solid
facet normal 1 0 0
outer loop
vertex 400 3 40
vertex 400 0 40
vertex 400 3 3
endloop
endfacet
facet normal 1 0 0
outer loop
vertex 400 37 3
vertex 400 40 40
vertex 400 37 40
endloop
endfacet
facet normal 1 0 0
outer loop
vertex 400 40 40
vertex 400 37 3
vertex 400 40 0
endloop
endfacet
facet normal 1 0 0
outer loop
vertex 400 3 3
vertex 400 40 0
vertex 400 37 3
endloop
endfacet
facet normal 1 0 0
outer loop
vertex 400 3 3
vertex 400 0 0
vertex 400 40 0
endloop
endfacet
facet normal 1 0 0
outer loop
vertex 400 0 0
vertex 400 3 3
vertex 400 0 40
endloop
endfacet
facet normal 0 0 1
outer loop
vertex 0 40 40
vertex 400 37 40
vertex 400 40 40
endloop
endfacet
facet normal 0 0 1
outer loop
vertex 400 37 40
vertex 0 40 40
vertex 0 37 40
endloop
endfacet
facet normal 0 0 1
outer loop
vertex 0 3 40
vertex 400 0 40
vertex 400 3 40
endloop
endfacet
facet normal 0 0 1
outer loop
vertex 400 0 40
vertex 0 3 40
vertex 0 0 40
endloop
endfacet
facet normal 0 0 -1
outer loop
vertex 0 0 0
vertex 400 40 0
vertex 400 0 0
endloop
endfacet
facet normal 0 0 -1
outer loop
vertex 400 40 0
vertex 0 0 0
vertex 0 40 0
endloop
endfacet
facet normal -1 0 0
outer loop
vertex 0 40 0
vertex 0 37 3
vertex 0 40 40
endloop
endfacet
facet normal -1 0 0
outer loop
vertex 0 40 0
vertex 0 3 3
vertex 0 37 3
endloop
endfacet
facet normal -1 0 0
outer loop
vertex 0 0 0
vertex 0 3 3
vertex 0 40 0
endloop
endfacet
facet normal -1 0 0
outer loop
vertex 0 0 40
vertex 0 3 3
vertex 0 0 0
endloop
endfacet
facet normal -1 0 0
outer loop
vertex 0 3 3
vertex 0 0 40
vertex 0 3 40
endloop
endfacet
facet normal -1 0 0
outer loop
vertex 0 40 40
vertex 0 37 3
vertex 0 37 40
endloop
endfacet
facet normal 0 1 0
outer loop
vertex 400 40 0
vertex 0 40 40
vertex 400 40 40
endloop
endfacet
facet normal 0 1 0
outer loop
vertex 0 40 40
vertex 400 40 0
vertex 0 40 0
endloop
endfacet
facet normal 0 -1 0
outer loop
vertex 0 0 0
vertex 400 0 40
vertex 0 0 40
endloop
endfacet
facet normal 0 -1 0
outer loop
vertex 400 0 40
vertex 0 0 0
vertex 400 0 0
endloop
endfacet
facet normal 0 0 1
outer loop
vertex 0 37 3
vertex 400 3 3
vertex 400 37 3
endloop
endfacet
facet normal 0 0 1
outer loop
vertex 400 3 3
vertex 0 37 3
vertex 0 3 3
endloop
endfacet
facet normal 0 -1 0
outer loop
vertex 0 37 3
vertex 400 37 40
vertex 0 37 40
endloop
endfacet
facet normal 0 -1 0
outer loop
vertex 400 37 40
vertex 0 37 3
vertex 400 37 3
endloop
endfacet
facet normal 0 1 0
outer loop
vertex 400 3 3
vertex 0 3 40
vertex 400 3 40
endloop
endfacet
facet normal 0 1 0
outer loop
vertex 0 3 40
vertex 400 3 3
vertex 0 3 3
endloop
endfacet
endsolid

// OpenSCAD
// file: utils.scad
// Author: Mihai Oltean, www.tcreate.org, mihai.oltean@gmail.com
// More details: jenny5.org
// Source: github.com/jenny5-robot
// MIT License
//--------------------------------------------------------------

module colt(radius, height)
{
	difference(){
		cube ([radius, radius, height]);
		cylinder	(h = height, r = radius, $fn = 30);
	}
}
/////////////////////////////////////////////////////////////////////////////////////////////////////////////////////////
module colt_sferic(radius)
{
	difference(){
		cube ([radius, radius, radius]);
		sphere(r = radius, $fn = 40);
	}
}
/////////////////////////////////////////////////////////////////////////////////////////////////////////////////////////
module coloana_sferica(height, radius)
{
		difference(){
			cube ([height, height, height]);
			cylinder(h= height, r = radius, $fn = 50);
		}
}
/////////////////////////////////////////////////////////////////////////////////////////////////////////////////////////
// file: params_screws_nuts_washers.scad
m2_screw_radius = 1;
m2_nut_radius = 2.2;
m2_nut_height = 1.6;
m2_nut_thick = m2_nut_height;

m3_screw_radius = 1.5;
m3_nut_radius = 3.1;
m3_nut_height = 2.3;
m3_nut_thick = m3_nut_height;
m3_autolock_nut_thick = m3_nut_thick + 1;

m4_screw_radius = 2;
m4_nut_radius = 4;
m4_auto_lock_nut_height = 5;
m4_nut_height = 3.25;
m4_nut_thick = 3.25;

m5_screw_radius = 2.5;
m5_nut_radius = 4.6;
m5_nut_height = 4;

m6_screw_radius = 3;
m6_nut_radius = 5.65;
m6_nut_thick = 5;
m6_nut_slim_thick = 3;
m6_autolock_nut_thick = 6;
m6_long_nut_thick = 9;

m8_screw_head_height = 5.7;
m8_screw_radius = 3.9;
m8_nut_small_width = 12.8;
m8_nut_radius = 7.35;
m8_slim_nut_small_width = 12.4;
m8_nut_thick = 6.5;
m8_nut_height = m8_nut_thick;
m8_slim_nut_height = 5.5;
m8_screw_head_radius = 6.5;
m8_autolock_nut_thick = 8;

m10_screw_radius = 5;
m10_nut_thick = 8;
m10_nut_radius = 9.8;

m12_screw_radius = 6;
m12_nut_thick = 8;
m12_nut_radius = 11;

m10_long_nut_radius = 9.71;
m10_long_nut_height = 29.8;

m10_long_thick_nut_radius = 7.41;
m10_long_thick_nut_height = 30.4;

m12_plastic_nut_radius = 10.45;
m12_plastic_nut_height = 23.3;

tr12_3_nut_radius = 11;
tr12_3_nut_height = 18.1;

washer_5 = 0.97;

washer_4_12_radius = 6;
washer_4_12_external_radius = 6;
washer_4_12_thick = 1;
washer_4_thick = 1;
washer_4_12_internal_radius = 2.15;

washer_4_9_external_radius = 4.5;
washer_4_9_internal_radius = 2.15;
washer_4_9_thick = 1;

washer_6_thick = 1.5;
washer_8_thick = 1.5;
washer_5_thick = 1;

washer_10_height = 2;
// file: params_stepper_motors.scad
// Author: Mihai Oltean, www.tcreate.org, mihai.oltean@gmail.com
// More details: jenny5.org
// Source: github.com/jenny5-robot
// MIT License
//--------------------------------------------------------------

nema_17_width = 42.3;
nema_17_motor_height_sparkfun = 36;
nema_17_motor_hole_radius_sparkfun  = 14;
nema_17_motor_hole_radius_camiel  = 12;
nema_17_dist_between_screw_holes = 31;
nema_17_height = 47;
nema_17_shaft_length = 24;

nema_14_width = 39.3;
nema_14_motor_hole_radius  = 11;
nema_14_dist_between_screw_holes = 31;
nema_14_height = 47;
nema_14_shaft_length = 20;

nema_11_width = 28;
nema_11_motor_hole_radius = 11;
nema_11_motor_gearbox_radius = 14;
nema_11_motor_gearbox_hole_radius = 9;
nema_11_gearbox_dist_between_screw_holes = 22 / sqrt(2);
nema_11_dist_between_screw_holes = 23;
nema_11_height = 32;
nema_11_with_gearbox_height = 53;
nema_11_gearbox_length = 25;
nema_11_shaft_length = 18;

nema_17_motor_gearbox_radius = 18;
nema_17_gearbox_dist_between_screw_holes = 20;
nema_17_with_gearbox_height = 82.8;
nema_17_gearbox_length = 30;
nema_17_gearbox_base_height = 5;
nema_17_gearbox_shaft_length = 18;
nema_17_gearbox_shaft_radius = 4;
nema_17_gearbox_motor_hole_radius  = 11;



nema_11_sizes = [nema_11_width, nema_11_width, nema_11_height];

gauri_nema_17 = [
[0, 0, 0], 
[-nema_17_dist_between_screw_holes / 2, -nema_17_dist_between_screw_holes / 2, 0], 
[-nema_17_dist_between_screw_holes / 2, nema_17_dist_between_screw_holes / 2, 0], 
[nema_17_dist_between_screw_holes / 2, -nema_17_dist_between_screw_holes / 2, 0], 
[nema_17_dist_between_screw_holes / 2, nema_17_dist_between_screw_holes / 2, 0]
];

gauri_nema_11 = [
[0, 0, 0], 
[-nema_11_dist_between_screw_holes / 2, -nema_11_dist_between_screw_holes / 2, 0], 
[-nema_11_dist_between_screw_holes / 2, nema_11_dist_between_screw_holes / 2, 0], 
[nema_11_dist_between_screw_holes / 2, -nema_11_dist_between_screw_holes / 2, 0], 
[nema_11_dist_between_screw_holes / 2, nema_11_dist_between_screw_holes / 2, 0]
];

gearbox_nema_11_holes_position = [[0, 0, 0], 
[-nema_11_gearbox_dist_between_screw_holes / 2, -nema_11_gearbox_dist_between_screw_holes / 2, 0], [-nema_11_gearbox_dist_between_screw_holes / 2, nema_11_gearbox_dist_between_screw_holes / 2, 0], [nema_11_gearbox_dist_between_screw_holes / 2, -nema_11_gearbox_dist_between_screw_holes / 2, 0], [nema_11_gearbox_dist_between_screw_holes / 2, nema_11_gearbox_dist_between_screw_holes / 2, 0]];

gearbox_nema_17_holes_position = [
[0, 0, 0], 
[-nema_17_gearbox_dist_between_screw_holes / 2, -nema_17_gearbox_dist_between_screw_holes / 2, 0], 
[-nema_17_gearbox_dist_between_screw_holes / 2, nema_17_gearbox_dist_between_screw_holes / 2, 0], 
[nema_17_gearbox_dist_between_screw_holes / 2, -nema_17_gearbox_dist_between_screw_holes / 2, 0], 
[nema_17_gearbox_dist_between_screw_holes / 2, nema_17_gearbox_dist_between_screw_holes / 2, 0]
];
// file: config.scad
// Author: Mihai Oltean, www.tcreate.org, mihai.oltean@gmail.com
// More details: jenny5.org
// Source: github.com/jenny5-robot
// MIT License
//--------------------------------------------------------------

aluminium_color = "Silver";
screw_color = "LightSlateGray";
frame_color = aluminium_color;
shaft_color = "Silver";
plastic_color = "LimeGreen";
pulley_color = "DarkSlateGray";
// file: params_basic_components.scad
// Author: Mihai Oltean, www.tcreate.org, mihai.oltean@gmail.com
// More details: jenny5.org
// Source: github.com/jenny5-robot
// MIT License
//--------------------------------------------------------------

spring_length = 20;

smooth_rod_8_radius = 4;
smooth_rod_10_radius = 5;
smooth_rod_12_radius = 6;

tolerance = 0.1;
display_tolerance = 1;

overlap_tolerance = 0.01;


wall_thick_1 = 1;
wall_thick_2 = 2;
wall_thick_3 = 3;
wall_thick_4 = 4;
wall_thick_5 = 5;
wall_thick_5_5 = 5.5;
wall_thick_6 = 6;
wall_thick_7 = 7;
wall_thick_8 = 8;
wall_thick_9 = 9;
wall_thick_10 = 10;
wall_thick_12 = 10;

wrench_radius = 11;

ghidaj_radius = 4;
ghidaj_radius_12 = 6;

canal_diameter = 8.22;
canal_height = 2.2;

filament_radius = 0.9;

bowden_tube_radius = 2.5;

m3_tolerance = 0.1;

latura_mare_L = 40;
latura_mica_L = 15;
grosime_perete_L = 3;

latura_L_50x50 = 50;
latura_L_40x40 = 40;

latura_U_50x50 = 50;
latura_U_40x40 = 40;


tolerance_z = [0, 0, tolerance];
tolerance_x = [tolerance, 0, 0];
tolerance_y = [0, tolerance, 0];

display_tolerance_z = [0, 0, display_tolerance];
display_tolerance_x = [display_tolerance, 0, 0];
display_tolerance_y = [0, display_tolerance, 0];
// main file
// Author: Mihai Oltean, www.tcreate.org, mihai.oltean@gmail.com
// More details: jenny5.org
// Source: github.com/jenny5-robot
// MIT License
//--------------------------------------------------------------

include <params_basic_components.scad>
include <config.scad>
include <basic_components.scad>
include <params_stepper_motors.scad>

////////////////////////////////////////////////////////////////////////////////////////////////////////////////////////////////////////////
module gauri_nema(nema_width, nema_dist_between_screw_holes, adancime, radius1 = 1.5, radius2 = 1.5, tolerance_x = 0, tolerance_y = 0)
{
	radius = m3_screw_radius;
hull(){
	translate ([nema_width / 2 - nema_dist_between_screw_holes / 2 - tolerance_x, nema_width / 2 - nema_dist_between_screw_holes / 2 - tolerance_y, 0] - display_tolerance_z) cylinder (h = adancime + 2 * display_tolerance, r1 = radius1, r2 = radius2, $fn = 50);
	translate ([nema_width / 2 - nema_dist_between_screw_holes / 2 + tolerance_x, nema_width / 2 - nema_dist_between_screw_holes / 2 + tolerance_y, 0] - display_tolerance_z) cylinder (h = adancime + 2 * display_tolerance, r1 = radius1, r2 = radius2, $fn = 50);
}
hull(){
	translate ([nema_width / 2 + nema_dist_between_screw_holes / 2 - tolerance_x, nema_width / 2 - nema_dist_between_screw_holes / 2 - tolerance_y, 0] - display_tolerance_z) cylinder (h = adancime + 2 * display_tolerance, r1 = radius1, r2 = radius2, $fn = 50);
	translate ([nema_width / 2 + nema_dist_between_screw_holes / 2 + tolerance_x, nema_width / 2 - nema_dist_between_screw_holes / 2 + tolerance_y, 0] - display_tolerance_z) cylinder (h = adancime + 2 * display_tolerance, r1 = radius1, r2 = radius2, $fn = 50);
}
hull(){
	translate ([nema_width / 2 - nema_dist_between_screw_holes / 2 - tolerance_x, nema_width / 2 + nema_dist_between_screw_holes / 2 - tolerance_y, 0] - display_tolerance_z) cylinder (h = adancime + 2 * display_tolerance, r1 = radius1, r2 = radius2, $fn = 50);
	translate ([nema_width / 2 - nema_dist_between_screw_holes / 2 + tolerance_x, nema_width / 2 + nema_dist_between_screw_holes / 2 + tolerance_y, 0] - display_tolerance_z) cylinder (h = adancime + 2 * display_tolerance, r1 = radius1, r2 = radius2, $fn = 50);
}
hull(){
	translate ([nema_width / 2 + nema_dist_between_screw_holes / 2 - tolerance_x, nema_width / 2 + nema_dist_between_screw_holes / 2 - tolerance_y, 0] - display_tolerance_z) cylinder (h = adancime  + 2 * display_tolerance, r1 = radius1, r2 = radius2, $fn = 50);
	translate ([nema_width / 2 + nema_dist_between_screw_holes / 2 + tolerance_x, nema_width / 2 + nema_dist_between_screw_holes / 2 + tolerance_y, 0] - display_tolerance_z) cylinder (h = adancime  + 2 * display_tolerance, r1 = radius1, r2 = radius2, $fn = 50);
}
}
////////////////////////////////////////////////////////////////////////////////////////////////////////////////////////////////////////////
module gauri_nema17(adancime, radius1 = 1.5, radius2 = 1.5, tolerance_x = 0, tolerance_y = 0)
{
	gauri_nema(nema_17_width, nema_17_dist_between_screw_holes, adancime, radius1, radius2, tolerance_x, tolerance_y);
}
////////////////////////////////////////////////////////////////////////////////////////////////////////////////////////////////////////////
module gauri_nema11(adancime, radius1 = 1.5, radius2 = 1.5)
{
	gauri_nema(nema_11_width, nema_11_dist_between_screw_holes, adancime, radius1, radius2);
}
////////////////////////////////////////////////////////////////////////////////////////////////////////////////////////////////////////////
module gauri_nema17_with_motor_hole(adancime, radius1 = 1.5, radius2 = 1.5, tolerance_x = 0, tolerance_y = 0)
{
	gauri_nema17(adancime, radius1, radius2, tolerance_x, tolerance_y);
// gaura motor
    
    hull(){
        translate ([nema_17_width / 2 - tolerance_x, nema_17_width / 2 - tolerance_y, 0] - display_tolerance_z) cylinder (h = adancime + 2 * display_tolerance, r = nema_17_motor_hole_radius_camiel, $fn = 50);
        translate ([nema_17_width / 2 + tolerance_x, nema_17_width / 2 + tolerance_y, 0] - display_tolerance_z) cylinder (h = adancime + 2 * display_tolerance, r = nema_17_motor_hole_radius_camiel, $fn = 50);
    }

}
////////////////////////////////////////////////////////////////////////////////////////////////////////////////////////////////////////////
module gauri_nema11_with_motor_hole(adancime, radius1 = 1.5, radius2 = 1.5)
{
	gauri_nema11(adancime, radius1, radius2);
// gaura motor
	translate ([nema_11_width / 2, nema_11_width / 2, 0] - display_tolerance_z) cylinder (h = adancime + 2 * display_tolerance, r = nema_11_motor_hole_radius, $fn = 50);

}
////////////////////////////////////////////////////////////////////////////////////////////////////////////////////////////////////////////
module gauri_toleranta_nema17(adancime, tolerance)
{
	radius = m3_screw_radius;

	hull(){
		translate ([nema_17_width / 2 - nema_17_dist_between_screw_holes / 2, nema_17_width / 2 - nema_17_dist_between_screw_holes / 2, 0] - display_tolerance_z) cylinder (h = adancime + 2 * display_tolerance, r = radius, $fn = 50);
		translate ([nema_17_width / 2 - nema_17_dist_between_screw_holes / 2 + tolerance, nema_17_width / 2 - nema_17_dist_between_screw_holes / 2, 0] - display_tolerance_z) cylinder (h = adancime + 2 * display_tolerance, r = radius, $fn = 50);
	}
	hull(){
		translate ([nema_17_width / 2 + nema_17_dist_between_screw_holes / 2, nema_17_width / 2 - nema_17_dist_between_screw_holes / 2, 0] - display_tolerance_z) cylinder (h = adancime + 2 * display_tolerance, r = radius, $fn = 50);
		translate ([nema_17_width / 2 + nema_17_dist_between_screw_holes / 2 + tolerance, nema_17_width / 2 - nema_17_dist_between_screw_holes / 2, 0] - display_tolerance_z) cylinder (h = adancime + 2 * display_tolerance, r = radius, $fn = 50);
	}
	hull(){
		translate ([nema_17_width / 2 - nema_17_dist_between_screw_holes / 2, nema_17_width / 2 + nema_17_dist_between_screw_holes / 2, 0] - display_tolerance_z) cylinder (h = adancime + 2 * display_tolerance, r = radius, $fn = 50);
		translate ([nema_17_width / 2 - nema_17_dist_between_screw_holes / 2 + tolerance, nema_17_width / 2 + nema_17_dist_between_screw_holes / 2, 0] - display_tolerance_z) cylinder (h = adancime + 2 * display_tolerance, r = radius, $fn = 50);
	}
	hull(){
		translate ([nema_17_width / 2 + nema_17_dist_between_screw_holes / 2, nema_17_width / 2 + nema_17_dist_between_screw_holes / 2, 0] - display_tolerance_z) cylinder (h = adancime  + 2 * display_tolerance, r = radius, $fn = 50);
		translate ([nema_17_width / 2 + nema_17_dist_between_screw_holes / 2 + tolerance, nema_17_width / 2 + nema_17_dist_between_screw_holes / 2, 0] - display_tolerance_z) cylinder (h = adancime  + 2 * display_tolerance, r = radius, $fn = 50);
	}

	hull(){
		translate ([nema_17_width / 2 - tolerance / 2, nema_17_width / 2, 0] - display_tolerance_z) cylinder (h = adancime + 2 * display_tolerance, r = nema_17_motor_hole_radius_camiel, $fn = 50);
		translate ([nema_17_width / 2 + tolerance / 2, nema_17_width / 2, 0] - display_tolerance_z) cylinder (h = adancime + 2 * display_tolerance, r = nema_17_motor_hole_radius_camiel, $fn = 50);
	}
}
////////////////////////////////////////////////////////////////////////////////////////////////////////////////////////////////////////////
module screws_nema17(screw_radius, screw_length, head_radius, head_thick)
{
	translate ([nema_17_width / 2 - nema_17_dist_between_screw_holes / 2, nema_17_width / 2 - nema_17_dist_between_screw_holes / 2, 0]) screw(screw_radius, screw_length, head_radius, head_thick);
	translate ([nema_17_width / 2 + nema_17_dist_between_screw_holes / 2, nema_17_width / 2 - nema_17_dist_between_screw_holes / 2, 0]) screw(screw_radius, screw_length, head_radius, head_thick);
	translate ([nema_17_width / 2 - nema_17_dist_between_screw_holes / 2, nema_17_width / 2 + nema_17_dist_between_screw_holes / 2, 0]) screw(screw_radius, screw_length, head_radius, head_thick);
	translate ([nema_17_width / 2 + nema_17_dist_between_screw_holes / 2, nema_17_width / 2 + nema_17_dist_between_screw_holes / 2, 0]) screw(screw_radius, screw_length, head_radius, head_thick);
}
////////////////////////////////////////////////////////////////////////////////////////////////////////////////////////////////////////////
module sunken_screws_nema17(screw_length)
{
screw_radius = m3_screw_radius;
head_radius = m3_nut_radius;
head_thick = m3_nut_thick;

	translate ([nema_17_width / 2 - nema_17_dist_between_screw_holes / 2, nema_17_width / 2 - nema_17_dist_between_screw_holes / 2, 0]) sunken_screw(screw_radius, screw_length, head_radius, head_thick);
	translate ([nema_17_width / 2 + nema_17_dist_between_screw_holes / 2, nema_17_width / 2 - nema_17_dist_between_screw_holes / 2, 0]) sunken_screw(screw_radius, screw_length, head_radius, head_thick);
	translate ([nema_17_width / 2 - nema_17_dist_between_screw_holes / 2, nema_17_width / 2 + nema_17_dist_between_screw_holes / 2, 0]) sunken_screw(screw_radius, screw_length, head_radius, head_thick);
	translate ([nema_17_width / 2 + nema_17_dist_between_screw_holes / 2, nema_17_width / 2 + nema_17_dist_between_screw_holes / 2, 0]) sunken_screw(screw_radius, screw_length, head_radius, head_thick);
}
////////////////////////////////////////////////////////////////////////////////////////////////////////////////////////////////////////////
module washers_nema17(internal_radius, external_radius, thick)
{
	translate ([nema_17_width / 2 - nema_17_dist_between_screw_holes / 2, nema_17_width / 2 - nema_17_dist_between_screw_holes / 2, 0]) washer(internal_radius, external_radius, thick);
	translate ([nema_17_width / 2 + nema_17_dist_between_screw_holes / 2, nema_17_width / 2 - nema_17_dist_between_screw_holes / 2, 0]) washer(internal_radius, external_radius, thick);
	translate ([nema_17_width / 2 - nema_17_dist_between_screw_holes / 2, nema_17_width / 2 + nema_17_dist_between_screw_holes / 2, 0]) washer(internal_radius, external_radius, thick);
	translate ([nema_17_width / 2 + nema_17_dist_between_screw_holes / 2, nema_17_width / 2 + nema_17_dist_between_screw_holes / 2, 0]) washer(internal_radius, external_radius, thick);
}
////////////////////////////////////////////////////////////////////////////////////////////////////////////////////////////////////////////
